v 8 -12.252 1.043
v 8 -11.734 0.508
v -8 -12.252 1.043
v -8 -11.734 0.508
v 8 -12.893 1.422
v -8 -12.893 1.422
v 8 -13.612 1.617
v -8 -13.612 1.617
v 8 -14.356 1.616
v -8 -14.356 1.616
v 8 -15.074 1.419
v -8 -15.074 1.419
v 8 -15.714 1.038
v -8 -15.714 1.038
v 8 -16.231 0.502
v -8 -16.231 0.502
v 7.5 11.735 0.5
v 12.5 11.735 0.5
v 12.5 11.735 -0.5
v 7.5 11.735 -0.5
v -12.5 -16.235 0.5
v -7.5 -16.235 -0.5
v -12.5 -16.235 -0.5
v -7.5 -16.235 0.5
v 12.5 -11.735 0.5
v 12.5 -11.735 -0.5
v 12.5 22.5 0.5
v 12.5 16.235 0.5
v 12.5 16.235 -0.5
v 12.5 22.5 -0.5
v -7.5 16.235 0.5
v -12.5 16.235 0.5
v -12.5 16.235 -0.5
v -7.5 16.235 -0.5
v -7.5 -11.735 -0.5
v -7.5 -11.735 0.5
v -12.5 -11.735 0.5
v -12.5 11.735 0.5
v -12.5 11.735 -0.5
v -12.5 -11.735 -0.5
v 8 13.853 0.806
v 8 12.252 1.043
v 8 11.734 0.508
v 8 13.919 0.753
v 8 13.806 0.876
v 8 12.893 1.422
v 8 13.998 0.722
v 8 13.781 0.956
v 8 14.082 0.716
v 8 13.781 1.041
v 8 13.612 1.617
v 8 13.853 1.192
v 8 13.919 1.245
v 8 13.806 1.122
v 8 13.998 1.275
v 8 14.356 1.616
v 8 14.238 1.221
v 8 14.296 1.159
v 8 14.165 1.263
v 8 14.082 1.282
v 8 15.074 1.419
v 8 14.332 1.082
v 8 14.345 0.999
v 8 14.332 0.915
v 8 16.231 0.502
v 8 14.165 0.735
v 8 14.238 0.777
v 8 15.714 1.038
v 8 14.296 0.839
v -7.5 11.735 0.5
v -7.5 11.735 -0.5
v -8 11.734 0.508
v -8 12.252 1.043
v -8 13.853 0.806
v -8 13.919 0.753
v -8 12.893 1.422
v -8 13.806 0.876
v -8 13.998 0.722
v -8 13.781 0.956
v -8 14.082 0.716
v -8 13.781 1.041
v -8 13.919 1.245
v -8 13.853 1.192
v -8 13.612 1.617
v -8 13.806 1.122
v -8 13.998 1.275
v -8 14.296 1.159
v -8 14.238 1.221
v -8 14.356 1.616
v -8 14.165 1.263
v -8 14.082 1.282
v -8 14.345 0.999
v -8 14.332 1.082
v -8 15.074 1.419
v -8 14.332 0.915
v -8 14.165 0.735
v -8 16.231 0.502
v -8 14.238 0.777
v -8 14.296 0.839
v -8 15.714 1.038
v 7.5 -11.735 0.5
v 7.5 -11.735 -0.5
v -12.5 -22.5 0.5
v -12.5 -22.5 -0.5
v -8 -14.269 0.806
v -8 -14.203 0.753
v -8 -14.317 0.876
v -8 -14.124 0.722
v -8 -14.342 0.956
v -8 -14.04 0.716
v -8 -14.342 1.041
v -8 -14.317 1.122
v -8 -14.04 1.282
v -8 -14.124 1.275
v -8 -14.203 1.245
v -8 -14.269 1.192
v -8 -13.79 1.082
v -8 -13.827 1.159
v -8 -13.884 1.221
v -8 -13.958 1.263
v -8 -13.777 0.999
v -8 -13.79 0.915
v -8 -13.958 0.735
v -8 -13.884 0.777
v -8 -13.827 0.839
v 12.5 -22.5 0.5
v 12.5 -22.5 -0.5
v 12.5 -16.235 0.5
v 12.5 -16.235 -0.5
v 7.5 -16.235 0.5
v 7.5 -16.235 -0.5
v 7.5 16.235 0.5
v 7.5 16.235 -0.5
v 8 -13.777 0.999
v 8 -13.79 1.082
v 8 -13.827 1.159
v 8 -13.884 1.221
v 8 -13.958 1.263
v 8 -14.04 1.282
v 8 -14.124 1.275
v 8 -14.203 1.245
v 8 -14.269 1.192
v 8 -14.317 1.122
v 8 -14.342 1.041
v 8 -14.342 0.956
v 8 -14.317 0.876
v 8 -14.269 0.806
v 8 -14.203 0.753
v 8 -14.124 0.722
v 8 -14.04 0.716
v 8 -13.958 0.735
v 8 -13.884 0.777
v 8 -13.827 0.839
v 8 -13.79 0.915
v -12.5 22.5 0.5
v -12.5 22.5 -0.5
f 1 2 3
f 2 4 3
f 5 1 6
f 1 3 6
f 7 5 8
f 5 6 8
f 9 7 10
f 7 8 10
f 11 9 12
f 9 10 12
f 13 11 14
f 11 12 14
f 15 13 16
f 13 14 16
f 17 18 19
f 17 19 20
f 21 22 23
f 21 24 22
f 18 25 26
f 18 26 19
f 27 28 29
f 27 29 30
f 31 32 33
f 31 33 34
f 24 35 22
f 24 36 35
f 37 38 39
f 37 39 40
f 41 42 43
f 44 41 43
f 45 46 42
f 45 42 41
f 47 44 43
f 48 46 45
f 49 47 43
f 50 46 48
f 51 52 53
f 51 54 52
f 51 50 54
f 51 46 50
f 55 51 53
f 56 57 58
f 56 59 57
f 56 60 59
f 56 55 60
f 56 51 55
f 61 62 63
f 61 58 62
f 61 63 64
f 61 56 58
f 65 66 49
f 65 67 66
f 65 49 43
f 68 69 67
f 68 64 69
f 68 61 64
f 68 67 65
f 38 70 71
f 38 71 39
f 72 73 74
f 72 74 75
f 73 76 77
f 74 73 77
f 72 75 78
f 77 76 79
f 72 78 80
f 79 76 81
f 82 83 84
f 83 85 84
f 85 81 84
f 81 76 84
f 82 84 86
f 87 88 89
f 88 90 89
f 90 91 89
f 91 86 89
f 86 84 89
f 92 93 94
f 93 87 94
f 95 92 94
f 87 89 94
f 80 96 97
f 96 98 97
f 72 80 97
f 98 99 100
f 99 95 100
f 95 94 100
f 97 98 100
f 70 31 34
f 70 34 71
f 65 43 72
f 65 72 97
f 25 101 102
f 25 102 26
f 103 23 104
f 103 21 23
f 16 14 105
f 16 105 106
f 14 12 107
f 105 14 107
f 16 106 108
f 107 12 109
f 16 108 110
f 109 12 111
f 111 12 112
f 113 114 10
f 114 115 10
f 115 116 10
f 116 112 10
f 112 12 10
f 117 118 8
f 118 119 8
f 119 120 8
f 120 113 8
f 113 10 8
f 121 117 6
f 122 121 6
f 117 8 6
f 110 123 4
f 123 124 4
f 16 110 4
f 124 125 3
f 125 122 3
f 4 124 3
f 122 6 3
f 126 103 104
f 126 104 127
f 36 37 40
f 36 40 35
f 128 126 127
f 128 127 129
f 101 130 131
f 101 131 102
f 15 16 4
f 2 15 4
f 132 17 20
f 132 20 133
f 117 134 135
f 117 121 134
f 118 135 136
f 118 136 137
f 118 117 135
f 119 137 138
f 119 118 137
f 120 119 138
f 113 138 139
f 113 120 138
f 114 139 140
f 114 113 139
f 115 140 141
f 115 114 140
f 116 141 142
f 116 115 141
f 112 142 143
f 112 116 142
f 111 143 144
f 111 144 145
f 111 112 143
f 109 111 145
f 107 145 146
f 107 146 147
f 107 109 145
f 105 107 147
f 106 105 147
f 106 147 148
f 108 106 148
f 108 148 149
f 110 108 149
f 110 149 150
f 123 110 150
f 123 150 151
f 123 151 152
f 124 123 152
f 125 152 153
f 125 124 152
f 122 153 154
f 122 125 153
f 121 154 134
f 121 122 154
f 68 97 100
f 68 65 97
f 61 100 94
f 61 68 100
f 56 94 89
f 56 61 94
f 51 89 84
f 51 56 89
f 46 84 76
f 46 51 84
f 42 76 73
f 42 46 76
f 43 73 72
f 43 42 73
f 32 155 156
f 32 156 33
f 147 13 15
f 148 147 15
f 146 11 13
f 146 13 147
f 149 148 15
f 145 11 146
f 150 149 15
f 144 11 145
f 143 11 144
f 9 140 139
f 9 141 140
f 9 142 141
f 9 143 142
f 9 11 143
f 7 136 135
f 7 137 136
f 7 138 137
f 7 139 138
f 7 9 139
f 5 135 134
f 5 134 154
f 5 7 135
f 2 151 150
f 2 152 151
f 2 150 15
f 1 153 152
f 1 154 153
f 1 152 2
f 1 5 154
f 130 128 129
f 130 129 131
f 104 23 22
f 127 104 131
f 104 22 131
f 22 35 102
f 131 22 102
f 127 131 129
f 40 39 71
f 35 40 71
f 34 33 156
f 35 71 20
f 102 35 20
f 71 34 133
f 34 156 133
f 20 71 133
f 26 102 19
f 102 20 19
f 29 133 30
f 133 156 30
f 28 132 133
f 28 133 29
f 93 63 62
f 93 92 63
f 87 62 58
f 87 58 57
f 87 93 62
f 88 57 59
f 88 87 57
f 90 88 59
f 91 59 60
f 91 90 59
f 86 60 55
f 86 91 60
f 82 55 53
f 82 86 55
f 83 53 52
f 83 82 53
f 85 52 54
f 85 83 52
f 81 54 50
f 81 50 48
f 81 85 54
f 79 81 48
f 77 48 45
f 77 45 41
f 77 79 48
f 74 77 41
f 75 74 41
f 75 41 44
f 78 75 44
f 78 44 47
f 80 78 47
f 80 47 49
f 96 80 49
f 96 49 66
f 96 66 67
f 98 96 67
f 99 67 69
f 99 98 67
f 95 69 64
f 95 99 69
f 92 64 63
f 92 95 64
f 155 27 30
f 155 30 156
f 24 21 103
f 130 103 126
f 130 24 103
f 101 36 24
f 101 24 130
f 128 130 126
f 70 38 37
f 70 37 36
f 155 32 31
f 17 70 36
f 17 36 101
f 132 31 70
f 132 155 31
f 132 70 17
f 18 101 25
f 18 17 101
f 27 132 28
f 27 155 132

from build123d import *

# Parameters (mm, degrees)
F1_DEPTH = 0.5
F2_R     = 0.283788
F3_DEPTH = 8


with BuildPart() as f1:
    # F0 (on Top) → F1 (new body, symmetric)
    with BuildSketch(Plane.XY):
        Polygon((-12.5, -16.234914), (-12.5, -22.5), (12.5, -22.5), (12.5, -16.234914), (7.5, -16.234914), (7.5, -11.734914), (12.5, -11.734914), (12.5, 11.734914), (7.5, 11.734914), (7.5, 16.234914), (12.5, 16.234914), (12.5, 22.5), (-12.5, 22.5), (-12.5, 16.234914), (-7.5, 16.234914), (-7.5, 11.734914), (-12.5, 11.734914), (-12.5, -11.734914), (-7.5, -11.734914), (-7.5, -16.234914), align=None)
    extrude(amount=F1_DEPTH, both=True)


with BuildPart() as f3:
    # F2 (on Right) → F3 (new body, symmetric)
    with BuildSketch(Plane.YZ):
        with BuildLine():
            Line((-16.231198, 0.501725), (-11.733621, 0.507786))
            ThreePointArc((-11.733621, 0.507786), (-13.983942, 1.641847), (-16.231198, 0.501725))
        make_face()
        with Locations((-14.061208, 0.998761)):
            Circle(F2_R, mode=Mode.SUBTRACT)
        with BuildLine():
            ThreePointArc((16.231198, 0.501725), (13.983942, 1.641847), (11.733621, 0.507786))
            Line((11.733621, 0.507786), (16.231198, 0.501725))
        make_face()
        with Locations((14.061208, 0.998761)):
            Circle(F2_R, mode=Mode.SUBTRACT)
    extrude(amount=F3_DEPTH, both=True)


solid = Compound([f1.part, f3.part])
